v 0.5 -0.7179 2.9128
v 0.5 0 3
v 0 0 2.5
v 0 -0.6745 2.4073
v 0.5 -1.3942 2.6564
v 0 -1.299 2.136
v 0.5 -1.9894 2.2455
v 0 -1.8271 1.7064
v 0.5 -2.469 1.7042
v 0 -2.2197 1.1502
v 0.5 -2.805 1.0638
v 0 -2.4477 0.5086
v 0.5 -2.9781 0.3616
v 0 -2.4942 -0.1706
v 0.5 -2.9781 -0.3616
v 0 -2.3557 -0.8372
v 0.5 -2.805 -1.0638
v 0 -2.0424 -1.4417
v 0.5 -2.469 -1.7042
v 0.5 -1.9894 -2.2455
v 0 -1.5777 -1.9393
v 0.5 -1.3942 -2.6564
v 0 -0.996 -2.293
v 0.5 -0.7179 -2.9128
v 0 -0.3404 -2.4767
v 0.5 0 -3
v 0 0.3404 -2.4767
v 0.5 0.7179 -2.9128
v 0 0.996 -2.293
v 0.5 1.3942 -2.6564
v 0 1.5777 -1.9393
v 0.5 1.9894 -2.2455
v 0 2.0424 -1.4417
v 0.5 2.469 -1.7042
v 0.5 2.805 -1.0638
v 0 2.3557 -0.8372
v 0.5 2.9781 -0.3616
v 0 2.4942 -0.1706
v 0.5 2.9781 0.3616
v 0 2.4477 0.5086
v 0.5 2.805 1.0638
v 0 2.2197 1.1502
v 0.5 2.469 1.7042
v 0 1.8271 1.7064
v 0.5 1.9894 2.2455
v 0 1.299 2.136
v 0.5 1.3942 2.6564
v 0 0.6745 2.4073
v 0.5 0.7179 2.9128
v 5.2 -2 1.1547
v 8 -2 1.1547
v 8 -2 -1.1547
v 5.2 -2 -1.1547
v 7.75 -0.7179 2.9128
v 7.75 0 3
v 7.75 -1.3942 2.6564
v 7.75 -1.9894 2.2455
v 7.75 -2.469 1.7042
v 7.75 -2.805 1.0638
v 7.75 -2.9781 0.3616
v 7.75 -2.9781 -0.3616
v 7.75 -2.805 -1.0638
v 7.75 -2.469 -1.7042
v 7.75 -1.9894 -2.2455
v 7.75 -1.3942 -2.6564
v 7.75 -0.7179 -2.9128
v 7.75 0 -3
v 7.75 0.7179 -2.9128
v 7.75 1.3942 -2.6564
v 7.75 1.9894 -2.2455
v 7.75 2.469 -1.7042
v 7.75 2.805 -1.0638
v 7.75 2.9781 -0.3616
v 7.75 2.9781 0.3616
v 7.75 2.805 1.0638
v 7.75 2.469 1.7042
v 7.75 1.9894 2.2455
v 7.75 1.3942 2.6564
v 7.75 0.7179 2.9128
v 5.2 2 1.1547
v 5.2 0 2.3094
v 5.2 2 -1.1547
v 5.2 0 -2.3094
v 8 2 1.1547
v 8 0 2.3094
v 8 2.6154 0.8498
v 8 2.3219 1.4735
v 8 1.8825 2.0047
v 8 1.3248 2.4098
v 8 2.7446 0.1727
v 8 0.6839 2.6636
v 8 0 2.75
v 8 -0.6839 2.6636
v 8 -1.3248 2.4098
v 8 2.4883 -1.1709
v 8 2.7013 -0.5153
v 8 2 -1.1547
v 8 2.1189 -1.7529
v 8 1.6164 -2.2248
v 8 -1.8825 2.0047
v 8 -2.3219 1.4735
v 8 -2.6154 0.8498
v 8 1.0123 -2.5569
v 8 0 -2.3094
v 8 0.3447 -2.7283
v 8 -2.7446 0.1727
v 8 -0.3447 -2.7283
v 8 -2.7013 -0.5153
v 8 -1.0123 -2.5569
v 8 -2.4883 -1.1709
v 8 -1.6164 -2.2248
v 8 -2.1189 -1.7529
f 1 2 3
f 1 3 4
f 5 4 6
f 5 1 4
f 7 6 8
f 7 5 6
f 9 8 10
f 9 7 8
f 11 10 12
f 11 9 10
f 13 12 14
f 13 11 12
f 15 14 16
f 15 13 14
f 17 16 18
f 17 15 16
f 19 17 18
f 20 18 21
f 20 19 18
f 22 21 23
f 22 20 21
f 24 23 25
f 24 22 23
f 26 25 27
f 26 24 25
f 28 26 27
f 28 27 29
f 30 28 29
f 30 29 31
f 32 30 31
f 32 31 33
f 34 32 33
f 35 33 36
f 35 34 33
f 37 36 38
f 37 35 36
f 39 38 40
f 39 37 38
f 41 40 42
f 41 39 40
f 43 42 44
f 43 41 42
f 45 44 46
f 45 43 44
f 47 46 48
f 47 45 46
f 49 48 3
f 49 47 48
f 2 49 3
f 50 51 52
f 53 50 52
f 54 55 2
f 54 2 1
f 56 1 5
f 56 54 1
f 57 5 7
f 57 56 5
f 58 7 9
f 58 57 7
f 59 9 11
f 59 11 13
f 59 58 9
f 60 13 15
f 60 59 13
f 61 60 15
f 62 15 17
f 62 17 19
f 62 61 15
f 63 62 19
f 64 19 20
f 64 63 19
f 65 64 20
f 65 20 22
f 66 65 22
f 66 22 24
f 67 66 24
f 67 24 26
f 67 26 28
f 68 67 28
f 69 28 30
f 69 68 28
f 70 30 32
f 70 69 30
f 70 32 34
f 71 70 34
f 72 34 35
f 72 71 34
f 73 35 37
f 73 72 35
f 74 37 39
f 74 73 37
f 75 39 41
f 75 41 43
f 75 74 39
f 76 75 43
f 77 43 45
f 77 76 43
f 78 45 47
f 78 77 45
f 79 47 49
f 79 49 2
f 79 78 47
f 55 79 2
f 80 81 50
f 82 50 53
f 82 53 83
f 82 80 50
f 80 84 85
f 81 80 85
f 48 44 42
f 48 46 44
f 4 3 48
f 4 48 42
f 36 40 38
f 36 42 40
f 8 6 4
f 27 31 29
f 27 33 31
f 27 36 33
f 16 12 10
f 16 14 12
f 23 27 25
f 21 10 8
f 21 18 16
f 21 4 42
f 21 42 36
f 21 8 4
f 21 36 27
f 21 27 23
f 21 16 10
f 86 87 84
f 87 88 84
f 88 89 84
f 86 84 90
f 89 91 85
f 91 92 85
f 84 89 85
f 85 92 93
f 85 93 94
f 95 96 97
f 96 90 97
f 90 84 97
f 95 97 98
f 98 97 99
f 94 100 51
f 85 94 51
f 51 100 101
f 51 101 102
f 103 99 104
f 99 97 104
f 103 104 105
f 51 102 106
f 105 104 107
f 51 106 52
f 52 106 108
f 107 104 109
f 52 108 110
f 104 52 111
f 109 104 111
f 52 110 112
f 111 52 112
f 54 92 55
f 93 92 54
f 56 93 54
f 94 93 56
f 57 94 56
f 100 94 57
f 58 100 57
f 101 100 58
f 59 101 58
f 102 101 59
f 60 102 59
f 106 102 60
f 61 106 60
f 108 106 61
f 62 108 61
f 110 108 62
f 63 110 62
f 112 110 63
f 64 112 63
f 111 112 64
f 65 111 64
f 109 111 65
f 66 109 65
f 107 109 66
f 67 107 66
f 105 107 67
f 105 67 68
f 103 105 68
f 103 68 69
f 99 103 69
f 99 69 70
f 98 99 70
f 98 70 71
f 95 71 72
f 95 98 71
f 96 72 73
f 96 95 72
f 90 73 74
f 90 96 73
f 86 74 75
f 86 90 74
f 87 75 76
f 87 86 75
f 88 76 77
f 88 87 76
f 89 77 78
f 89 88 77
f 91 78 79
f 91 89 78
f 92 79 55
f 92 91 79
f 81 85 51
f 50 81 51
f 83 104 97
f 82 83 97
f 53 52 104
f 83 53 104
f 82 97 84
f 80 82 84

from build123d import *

# Parameters (mm, degrees)
ESQUISSE1_W             = 8
ESQUISSE1_H             = 3
CHANFREIN2_SIZE         = 0.5
EMPREINTE_POUR_CL_DEPTH = 2.8
CHANFREIN3_SIZE         = 0.25


with BuildPart() as part:
    # Esquisse1 → Base-Révolution (revolve)
    with BuildSketch(Plane.XY, mode=Mode.PRIVATE) as base_r_volution_sk:
        with Locations((4, 1.5)):
            Rectangle(ESQUISSE1_W, ESQUISSE1_H)
    revolve(base_r_volution_sk.sketch.rotate(Axis((-25.828475034, 0, 0), (1, 0, 0)), 90), axis=Axis((-25.828475034, 0, 0), (1, 0, 0)))

    # Chanfrein2
    chanfrein2_edges = [part.edges().sort_by_distance(p)[0] for p in [
        (0, 0, -3),
    ]]
    chamfer(chanfrein2_edges, length=CHANFREIN2_SIZE)

    # Esquisse2 → Empreinte pour clé (cut)
    with BuildSketch(Plane(origin=(8, 0, 0), x_dir=(0, 0, -1), z_dir=(1, 0, 0))):
        Polygon((2.309401077, 0), (1.154700538, 2), (-1.154700538, 2), (-2.309401077, 0), (-1.154700538, -2), (1.154700538, -2), align=None)
    extrude(amount=-EMPREINTE_POUR_CL_DEPTH, mode=Mode.SUBTRACT)

    # Chanfrein3
    chanfrein3_edges = [part.edges().sort_by_distance(p)[0] for p in [
        (8, 0, -3),
    ]]
    chamfer(chanfrein3_edges, length=CHANFREIN3_SIZE)


solid = part.part
